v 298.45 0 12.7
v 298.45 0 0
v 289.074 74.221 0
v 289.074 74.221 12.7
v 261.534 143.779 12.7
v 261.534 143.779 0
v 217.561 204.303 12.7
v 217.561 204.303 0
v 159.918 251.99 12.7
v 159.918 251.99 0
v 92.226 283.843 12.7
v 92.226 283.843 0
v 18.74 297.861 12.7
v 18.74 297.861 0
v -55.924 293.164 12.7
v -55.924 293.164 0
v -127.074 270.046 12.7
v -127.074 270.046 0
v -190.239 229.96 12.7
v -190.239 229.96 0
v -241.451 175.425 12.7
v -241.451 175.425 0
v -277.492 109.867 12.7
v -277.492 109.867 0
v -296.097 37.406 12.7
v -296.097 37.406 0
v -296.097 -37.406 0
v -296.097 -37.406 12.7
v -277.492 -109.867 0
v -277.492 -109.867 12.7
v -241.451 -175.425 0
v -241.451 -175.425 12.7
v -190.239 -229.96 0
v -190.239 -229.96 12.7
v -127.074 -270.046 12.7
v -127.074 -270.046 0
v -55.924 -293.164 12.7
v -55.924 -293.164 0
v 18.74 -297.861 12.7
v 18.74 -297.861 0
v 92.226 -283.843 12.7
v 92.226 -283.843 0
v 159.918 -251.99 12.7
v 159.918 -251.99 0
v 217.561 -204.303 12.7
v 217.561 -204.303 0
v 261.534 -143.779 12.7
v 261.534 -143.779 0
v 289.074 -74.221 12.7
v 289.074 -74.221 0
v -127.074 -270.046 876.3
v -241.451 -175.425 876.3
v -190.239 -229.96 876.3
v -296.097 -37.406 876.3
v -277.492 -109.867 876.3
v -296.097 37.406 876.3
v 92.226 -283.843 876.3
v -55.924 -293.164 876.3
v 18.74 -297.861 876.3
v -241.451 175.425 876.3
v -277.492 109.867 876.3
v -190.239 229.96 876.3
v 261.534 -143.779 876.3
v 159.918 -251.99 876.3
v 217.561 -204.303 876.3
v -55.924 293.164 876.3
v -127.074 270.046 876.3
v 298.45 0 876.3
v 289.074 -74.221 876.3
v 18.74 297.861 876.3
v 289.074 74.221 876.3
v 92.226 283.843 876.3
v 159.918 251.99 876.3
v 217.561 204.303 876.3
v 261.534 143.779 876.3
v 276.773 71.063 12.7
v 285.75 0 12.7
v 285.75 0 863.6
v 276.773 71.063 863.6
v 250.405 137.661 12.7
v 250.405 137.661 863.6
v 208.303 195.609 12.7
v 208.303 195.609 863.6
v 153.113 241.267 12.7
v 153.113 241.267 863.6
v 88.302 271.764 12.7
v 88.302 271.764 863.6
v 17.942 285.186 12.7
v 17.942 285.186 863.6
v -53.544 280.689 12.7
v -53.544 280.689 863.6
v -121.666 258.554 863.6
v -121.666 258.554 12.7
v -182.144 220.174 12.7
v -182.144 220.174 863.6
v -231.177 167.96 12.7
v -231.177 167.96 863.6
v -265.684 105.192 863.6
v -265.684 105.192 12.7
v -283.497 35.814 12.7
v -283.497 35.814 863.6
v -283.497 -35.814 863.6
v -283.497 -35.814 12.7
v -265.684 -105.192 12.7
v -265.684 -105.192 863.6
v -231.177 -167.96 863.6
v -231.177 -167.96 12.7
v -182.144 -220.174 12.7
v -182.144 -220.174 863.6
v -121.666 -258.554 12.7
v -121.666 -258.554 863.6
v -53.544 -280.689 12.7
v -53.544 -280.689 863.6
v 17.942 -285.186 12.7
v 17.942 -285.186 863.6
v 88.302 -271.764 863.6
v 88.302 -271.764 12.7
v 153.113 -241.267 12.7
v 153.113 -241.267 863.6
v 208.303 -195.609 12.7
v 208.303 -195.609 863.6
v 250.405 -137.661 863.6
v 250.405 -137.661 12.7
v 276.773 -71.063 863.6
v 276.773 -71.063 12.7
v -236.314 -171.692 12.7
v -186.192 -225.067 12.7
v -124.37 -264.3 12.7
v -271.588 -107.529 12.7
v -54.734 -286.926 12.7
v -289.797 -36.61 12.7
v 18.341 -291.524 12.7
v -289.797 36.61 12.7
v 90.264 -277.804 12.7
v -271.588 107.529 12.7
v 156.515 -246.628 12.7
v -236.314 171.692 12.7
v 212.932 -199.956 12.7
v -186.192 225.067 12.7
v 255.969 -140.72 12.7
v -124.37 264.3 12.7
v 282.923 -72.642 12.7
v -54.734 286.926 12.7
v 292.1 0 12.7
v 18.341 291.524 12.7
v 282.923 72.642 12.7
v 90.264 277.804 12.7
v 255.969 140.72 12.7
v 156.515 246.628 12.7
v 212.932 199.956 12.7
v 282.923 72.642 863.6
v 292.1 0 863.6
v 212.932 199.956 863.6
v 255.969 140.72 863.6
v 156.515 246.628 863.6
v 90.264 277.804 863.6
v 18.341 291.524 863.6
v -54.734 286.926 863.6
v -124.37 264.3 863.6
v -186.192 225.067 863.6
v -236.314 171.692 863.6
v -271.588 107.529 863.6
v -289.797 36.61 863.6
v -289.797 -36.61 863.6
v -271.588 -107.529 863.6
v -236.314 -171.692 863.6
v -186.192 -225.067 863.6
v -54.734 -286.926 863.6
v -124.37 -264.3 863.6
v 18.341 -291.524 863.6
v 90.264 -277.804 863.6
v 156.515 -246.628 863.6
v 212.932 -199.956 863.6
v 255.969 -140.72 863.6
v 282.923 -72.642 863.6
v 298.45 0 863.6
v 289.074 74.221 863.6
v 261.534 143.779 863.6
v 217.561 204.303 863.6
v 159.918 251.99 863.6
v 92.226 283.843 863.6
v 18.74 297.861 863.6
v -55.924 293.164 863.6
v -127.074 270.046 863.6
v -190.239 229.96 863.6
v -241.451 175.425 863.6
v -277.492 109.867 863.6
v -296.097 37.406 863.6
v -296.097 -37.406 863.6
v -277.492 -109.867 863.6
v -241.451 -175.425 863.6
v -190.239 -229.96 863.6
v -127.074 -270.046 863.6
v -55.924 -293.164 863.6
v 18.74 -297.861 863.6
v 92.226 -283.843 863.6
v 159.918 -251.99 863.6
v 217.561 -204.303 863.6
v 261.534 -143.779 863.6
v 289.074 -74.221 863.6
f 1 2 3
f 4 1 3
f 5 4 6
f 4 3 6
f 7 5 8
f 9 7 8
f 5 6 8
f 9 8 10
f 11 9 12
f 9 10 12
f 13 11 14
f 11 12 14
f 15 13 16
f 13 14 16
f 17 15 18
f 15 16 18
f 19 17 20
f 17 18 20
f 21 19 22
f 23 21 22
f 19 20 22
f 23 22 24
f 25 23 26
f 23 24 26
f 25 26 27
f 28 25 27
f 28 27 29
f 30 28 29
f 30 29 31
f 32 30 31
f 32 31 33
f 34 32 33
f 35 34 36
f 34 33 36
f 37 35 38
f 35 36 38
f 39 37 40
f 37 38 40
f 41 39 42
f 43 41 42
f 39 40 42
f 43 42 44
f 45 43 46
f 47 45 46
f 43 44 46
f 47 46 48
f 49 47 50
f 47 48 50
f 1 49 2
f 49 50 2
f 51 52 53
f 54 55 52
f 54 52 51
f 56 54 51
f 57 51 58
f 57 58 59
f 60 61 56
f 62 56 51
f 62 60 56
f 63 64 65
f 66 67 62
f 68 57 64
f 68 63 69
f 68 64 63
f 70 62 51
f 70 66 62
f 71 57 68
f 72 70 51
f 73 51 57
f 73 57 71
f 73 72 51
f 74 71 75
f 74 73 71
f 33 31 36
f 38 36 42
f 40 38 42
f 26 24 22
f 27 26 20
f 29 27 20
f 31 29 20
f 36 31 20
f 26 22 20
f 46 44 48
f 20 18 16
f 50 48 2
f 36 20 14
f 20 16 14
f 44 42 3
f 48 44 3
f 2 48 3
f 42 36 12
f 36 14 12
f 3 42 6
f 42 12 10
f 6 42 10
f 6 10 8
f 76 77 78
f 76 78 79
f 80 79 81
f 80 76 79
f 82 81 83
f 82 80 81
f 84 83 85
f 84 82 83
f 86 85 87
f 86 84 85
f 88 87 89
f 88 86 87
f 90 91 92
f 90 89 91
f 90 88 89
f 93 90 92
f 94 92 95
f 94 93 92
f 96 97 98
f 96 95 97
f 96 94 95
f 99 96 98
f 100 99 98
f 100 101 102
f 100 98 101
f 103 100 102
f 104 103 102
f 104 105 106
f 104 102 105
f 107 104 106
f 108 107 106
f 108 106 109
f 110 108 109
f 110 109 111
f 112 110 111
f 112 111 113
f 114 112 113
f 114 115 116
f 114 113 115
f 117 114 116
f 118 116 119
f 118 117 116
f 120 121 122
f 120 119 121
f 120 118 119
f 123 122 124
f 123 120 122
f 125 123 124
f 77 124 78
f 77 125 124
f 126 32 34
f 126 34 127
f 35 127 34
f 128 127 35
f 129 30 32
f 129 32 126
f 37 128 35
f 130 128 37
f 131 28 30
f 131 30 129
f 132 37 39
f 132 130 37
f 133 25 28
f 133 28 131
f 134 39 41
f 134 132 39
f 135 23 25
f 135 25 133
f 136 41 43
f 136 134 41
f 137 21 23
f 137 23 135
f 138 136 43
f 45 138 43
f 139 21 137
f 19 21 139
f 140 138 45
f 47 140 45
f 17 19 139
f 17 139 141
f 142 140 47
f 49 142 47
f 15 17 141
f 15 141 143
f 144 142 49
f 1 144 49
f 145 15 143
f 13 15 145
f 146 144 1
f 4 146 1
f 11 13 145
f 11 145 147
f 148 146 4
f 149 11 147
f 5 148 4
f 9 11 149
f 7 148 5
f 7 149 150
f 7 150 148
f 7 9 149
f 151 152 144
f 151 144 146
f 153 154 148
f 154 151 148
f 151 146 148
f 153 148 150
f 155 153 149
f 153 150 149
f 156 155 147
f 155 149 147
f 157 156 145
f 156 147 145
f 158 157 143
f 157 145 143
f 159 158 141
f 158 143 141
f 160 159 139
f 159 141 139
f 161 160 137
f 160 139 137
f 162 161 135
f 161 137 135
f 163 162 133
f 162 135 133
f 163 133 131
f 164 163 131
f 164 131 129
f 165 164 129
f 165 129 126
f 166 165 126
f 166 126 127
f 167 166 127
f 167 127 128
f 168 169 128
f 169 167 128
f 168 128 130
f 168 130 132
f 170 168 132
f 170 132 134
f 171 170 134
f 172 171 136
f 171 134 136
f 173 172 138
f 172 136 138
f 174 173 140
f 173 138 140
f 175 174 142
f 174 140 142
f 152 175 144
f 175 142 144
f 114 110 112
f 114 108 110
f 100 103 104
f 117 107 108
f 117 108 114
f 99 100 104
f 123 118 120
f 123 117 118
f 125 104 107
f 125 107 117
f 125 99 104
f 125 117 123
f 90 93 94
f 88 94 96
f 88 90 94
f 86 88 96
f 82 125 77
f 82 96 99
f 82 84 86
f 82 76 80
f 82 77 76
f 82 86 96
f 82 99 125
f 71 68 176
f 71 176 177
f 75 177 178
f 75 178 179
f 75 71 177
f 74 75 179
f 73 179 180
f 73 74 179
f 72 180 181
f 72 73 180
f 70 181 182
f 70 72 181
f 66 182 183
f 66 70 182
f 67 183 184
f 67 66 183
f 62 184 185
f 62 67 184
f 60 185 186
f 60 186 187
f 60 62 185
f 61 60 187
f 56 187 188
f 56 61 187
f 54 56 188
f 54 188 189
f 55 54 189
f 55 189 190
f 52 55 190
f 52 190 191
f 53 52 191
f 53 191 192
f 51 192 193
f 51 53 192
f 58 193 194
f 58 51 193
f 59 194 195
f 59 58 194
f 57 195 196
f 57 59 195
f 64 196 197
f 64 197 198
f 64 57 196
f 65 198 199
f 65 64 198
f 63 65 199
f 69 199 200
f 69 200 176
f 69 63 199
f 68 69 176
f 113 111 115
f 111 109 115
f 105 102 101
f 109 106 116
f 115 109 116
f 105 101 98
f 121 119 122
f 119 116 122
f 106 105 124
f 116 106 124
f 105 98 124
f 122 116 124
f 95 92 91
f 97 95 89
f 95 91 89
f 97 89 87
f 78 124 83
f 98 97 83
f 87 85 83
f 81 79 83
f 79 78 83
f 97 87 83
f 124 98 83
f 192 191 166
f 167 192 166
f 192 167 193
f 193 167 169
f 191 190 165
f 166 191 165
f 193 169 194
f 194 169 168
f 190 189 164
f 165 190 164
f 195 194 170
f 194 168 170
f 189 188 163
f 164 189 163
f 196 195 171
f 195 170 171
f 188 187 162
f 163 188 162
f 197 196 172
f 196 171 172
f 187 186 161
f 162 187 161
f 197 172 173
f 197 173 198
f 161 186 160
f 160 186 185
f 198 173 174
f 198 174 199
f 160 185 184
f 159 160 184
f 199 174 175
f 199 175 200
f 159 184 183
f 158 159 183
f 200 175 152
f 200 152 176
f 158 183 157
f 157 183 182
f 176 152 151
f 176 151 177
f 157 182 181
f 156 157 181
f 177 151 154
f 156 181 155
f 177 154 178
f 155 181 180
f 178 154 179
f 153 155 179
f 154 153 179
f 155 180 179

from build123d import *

# Parameters (mm, degrees)
F0_R     = 298.45
F0_R_2   = 292.1
F0_R_3   = 285.75
F1_DEPTH = 12.7
F2_DEPTH = 876.3
F3_R     = 298.45
F4_DEPTH = 12.7


with BuildPart() as f1:
    # F0 (on Top) → F1 (new body)
    with BuildSketch(Plane.XY):
        Circle(F0_R)
        Circle(F0_R_2, mode=Mode.SUBTRACT)
        Circle(F0_R_2)
        Circle(F0_R_3, mode=Mode.SUBTRACT)
        Circle(F0_R_3)
    extrude(amount=F1_DEPTH)

    # F0 (on Top) → F2 (join)
    with BuildSketch(Plane.XY):
        Circle(F0_R_2)
        Circle(F0_R_3, mode=Mode.SUBTRACT)
    extrude(amount=F2_DEPTH)

    # F3 (on face) → F4 (join)
    with BuildSketch(Plane.XY.offset(876.3)):
        Circle(F3_R)
    extrude(amount=-F4_DEPTH)


solid = f1.part
